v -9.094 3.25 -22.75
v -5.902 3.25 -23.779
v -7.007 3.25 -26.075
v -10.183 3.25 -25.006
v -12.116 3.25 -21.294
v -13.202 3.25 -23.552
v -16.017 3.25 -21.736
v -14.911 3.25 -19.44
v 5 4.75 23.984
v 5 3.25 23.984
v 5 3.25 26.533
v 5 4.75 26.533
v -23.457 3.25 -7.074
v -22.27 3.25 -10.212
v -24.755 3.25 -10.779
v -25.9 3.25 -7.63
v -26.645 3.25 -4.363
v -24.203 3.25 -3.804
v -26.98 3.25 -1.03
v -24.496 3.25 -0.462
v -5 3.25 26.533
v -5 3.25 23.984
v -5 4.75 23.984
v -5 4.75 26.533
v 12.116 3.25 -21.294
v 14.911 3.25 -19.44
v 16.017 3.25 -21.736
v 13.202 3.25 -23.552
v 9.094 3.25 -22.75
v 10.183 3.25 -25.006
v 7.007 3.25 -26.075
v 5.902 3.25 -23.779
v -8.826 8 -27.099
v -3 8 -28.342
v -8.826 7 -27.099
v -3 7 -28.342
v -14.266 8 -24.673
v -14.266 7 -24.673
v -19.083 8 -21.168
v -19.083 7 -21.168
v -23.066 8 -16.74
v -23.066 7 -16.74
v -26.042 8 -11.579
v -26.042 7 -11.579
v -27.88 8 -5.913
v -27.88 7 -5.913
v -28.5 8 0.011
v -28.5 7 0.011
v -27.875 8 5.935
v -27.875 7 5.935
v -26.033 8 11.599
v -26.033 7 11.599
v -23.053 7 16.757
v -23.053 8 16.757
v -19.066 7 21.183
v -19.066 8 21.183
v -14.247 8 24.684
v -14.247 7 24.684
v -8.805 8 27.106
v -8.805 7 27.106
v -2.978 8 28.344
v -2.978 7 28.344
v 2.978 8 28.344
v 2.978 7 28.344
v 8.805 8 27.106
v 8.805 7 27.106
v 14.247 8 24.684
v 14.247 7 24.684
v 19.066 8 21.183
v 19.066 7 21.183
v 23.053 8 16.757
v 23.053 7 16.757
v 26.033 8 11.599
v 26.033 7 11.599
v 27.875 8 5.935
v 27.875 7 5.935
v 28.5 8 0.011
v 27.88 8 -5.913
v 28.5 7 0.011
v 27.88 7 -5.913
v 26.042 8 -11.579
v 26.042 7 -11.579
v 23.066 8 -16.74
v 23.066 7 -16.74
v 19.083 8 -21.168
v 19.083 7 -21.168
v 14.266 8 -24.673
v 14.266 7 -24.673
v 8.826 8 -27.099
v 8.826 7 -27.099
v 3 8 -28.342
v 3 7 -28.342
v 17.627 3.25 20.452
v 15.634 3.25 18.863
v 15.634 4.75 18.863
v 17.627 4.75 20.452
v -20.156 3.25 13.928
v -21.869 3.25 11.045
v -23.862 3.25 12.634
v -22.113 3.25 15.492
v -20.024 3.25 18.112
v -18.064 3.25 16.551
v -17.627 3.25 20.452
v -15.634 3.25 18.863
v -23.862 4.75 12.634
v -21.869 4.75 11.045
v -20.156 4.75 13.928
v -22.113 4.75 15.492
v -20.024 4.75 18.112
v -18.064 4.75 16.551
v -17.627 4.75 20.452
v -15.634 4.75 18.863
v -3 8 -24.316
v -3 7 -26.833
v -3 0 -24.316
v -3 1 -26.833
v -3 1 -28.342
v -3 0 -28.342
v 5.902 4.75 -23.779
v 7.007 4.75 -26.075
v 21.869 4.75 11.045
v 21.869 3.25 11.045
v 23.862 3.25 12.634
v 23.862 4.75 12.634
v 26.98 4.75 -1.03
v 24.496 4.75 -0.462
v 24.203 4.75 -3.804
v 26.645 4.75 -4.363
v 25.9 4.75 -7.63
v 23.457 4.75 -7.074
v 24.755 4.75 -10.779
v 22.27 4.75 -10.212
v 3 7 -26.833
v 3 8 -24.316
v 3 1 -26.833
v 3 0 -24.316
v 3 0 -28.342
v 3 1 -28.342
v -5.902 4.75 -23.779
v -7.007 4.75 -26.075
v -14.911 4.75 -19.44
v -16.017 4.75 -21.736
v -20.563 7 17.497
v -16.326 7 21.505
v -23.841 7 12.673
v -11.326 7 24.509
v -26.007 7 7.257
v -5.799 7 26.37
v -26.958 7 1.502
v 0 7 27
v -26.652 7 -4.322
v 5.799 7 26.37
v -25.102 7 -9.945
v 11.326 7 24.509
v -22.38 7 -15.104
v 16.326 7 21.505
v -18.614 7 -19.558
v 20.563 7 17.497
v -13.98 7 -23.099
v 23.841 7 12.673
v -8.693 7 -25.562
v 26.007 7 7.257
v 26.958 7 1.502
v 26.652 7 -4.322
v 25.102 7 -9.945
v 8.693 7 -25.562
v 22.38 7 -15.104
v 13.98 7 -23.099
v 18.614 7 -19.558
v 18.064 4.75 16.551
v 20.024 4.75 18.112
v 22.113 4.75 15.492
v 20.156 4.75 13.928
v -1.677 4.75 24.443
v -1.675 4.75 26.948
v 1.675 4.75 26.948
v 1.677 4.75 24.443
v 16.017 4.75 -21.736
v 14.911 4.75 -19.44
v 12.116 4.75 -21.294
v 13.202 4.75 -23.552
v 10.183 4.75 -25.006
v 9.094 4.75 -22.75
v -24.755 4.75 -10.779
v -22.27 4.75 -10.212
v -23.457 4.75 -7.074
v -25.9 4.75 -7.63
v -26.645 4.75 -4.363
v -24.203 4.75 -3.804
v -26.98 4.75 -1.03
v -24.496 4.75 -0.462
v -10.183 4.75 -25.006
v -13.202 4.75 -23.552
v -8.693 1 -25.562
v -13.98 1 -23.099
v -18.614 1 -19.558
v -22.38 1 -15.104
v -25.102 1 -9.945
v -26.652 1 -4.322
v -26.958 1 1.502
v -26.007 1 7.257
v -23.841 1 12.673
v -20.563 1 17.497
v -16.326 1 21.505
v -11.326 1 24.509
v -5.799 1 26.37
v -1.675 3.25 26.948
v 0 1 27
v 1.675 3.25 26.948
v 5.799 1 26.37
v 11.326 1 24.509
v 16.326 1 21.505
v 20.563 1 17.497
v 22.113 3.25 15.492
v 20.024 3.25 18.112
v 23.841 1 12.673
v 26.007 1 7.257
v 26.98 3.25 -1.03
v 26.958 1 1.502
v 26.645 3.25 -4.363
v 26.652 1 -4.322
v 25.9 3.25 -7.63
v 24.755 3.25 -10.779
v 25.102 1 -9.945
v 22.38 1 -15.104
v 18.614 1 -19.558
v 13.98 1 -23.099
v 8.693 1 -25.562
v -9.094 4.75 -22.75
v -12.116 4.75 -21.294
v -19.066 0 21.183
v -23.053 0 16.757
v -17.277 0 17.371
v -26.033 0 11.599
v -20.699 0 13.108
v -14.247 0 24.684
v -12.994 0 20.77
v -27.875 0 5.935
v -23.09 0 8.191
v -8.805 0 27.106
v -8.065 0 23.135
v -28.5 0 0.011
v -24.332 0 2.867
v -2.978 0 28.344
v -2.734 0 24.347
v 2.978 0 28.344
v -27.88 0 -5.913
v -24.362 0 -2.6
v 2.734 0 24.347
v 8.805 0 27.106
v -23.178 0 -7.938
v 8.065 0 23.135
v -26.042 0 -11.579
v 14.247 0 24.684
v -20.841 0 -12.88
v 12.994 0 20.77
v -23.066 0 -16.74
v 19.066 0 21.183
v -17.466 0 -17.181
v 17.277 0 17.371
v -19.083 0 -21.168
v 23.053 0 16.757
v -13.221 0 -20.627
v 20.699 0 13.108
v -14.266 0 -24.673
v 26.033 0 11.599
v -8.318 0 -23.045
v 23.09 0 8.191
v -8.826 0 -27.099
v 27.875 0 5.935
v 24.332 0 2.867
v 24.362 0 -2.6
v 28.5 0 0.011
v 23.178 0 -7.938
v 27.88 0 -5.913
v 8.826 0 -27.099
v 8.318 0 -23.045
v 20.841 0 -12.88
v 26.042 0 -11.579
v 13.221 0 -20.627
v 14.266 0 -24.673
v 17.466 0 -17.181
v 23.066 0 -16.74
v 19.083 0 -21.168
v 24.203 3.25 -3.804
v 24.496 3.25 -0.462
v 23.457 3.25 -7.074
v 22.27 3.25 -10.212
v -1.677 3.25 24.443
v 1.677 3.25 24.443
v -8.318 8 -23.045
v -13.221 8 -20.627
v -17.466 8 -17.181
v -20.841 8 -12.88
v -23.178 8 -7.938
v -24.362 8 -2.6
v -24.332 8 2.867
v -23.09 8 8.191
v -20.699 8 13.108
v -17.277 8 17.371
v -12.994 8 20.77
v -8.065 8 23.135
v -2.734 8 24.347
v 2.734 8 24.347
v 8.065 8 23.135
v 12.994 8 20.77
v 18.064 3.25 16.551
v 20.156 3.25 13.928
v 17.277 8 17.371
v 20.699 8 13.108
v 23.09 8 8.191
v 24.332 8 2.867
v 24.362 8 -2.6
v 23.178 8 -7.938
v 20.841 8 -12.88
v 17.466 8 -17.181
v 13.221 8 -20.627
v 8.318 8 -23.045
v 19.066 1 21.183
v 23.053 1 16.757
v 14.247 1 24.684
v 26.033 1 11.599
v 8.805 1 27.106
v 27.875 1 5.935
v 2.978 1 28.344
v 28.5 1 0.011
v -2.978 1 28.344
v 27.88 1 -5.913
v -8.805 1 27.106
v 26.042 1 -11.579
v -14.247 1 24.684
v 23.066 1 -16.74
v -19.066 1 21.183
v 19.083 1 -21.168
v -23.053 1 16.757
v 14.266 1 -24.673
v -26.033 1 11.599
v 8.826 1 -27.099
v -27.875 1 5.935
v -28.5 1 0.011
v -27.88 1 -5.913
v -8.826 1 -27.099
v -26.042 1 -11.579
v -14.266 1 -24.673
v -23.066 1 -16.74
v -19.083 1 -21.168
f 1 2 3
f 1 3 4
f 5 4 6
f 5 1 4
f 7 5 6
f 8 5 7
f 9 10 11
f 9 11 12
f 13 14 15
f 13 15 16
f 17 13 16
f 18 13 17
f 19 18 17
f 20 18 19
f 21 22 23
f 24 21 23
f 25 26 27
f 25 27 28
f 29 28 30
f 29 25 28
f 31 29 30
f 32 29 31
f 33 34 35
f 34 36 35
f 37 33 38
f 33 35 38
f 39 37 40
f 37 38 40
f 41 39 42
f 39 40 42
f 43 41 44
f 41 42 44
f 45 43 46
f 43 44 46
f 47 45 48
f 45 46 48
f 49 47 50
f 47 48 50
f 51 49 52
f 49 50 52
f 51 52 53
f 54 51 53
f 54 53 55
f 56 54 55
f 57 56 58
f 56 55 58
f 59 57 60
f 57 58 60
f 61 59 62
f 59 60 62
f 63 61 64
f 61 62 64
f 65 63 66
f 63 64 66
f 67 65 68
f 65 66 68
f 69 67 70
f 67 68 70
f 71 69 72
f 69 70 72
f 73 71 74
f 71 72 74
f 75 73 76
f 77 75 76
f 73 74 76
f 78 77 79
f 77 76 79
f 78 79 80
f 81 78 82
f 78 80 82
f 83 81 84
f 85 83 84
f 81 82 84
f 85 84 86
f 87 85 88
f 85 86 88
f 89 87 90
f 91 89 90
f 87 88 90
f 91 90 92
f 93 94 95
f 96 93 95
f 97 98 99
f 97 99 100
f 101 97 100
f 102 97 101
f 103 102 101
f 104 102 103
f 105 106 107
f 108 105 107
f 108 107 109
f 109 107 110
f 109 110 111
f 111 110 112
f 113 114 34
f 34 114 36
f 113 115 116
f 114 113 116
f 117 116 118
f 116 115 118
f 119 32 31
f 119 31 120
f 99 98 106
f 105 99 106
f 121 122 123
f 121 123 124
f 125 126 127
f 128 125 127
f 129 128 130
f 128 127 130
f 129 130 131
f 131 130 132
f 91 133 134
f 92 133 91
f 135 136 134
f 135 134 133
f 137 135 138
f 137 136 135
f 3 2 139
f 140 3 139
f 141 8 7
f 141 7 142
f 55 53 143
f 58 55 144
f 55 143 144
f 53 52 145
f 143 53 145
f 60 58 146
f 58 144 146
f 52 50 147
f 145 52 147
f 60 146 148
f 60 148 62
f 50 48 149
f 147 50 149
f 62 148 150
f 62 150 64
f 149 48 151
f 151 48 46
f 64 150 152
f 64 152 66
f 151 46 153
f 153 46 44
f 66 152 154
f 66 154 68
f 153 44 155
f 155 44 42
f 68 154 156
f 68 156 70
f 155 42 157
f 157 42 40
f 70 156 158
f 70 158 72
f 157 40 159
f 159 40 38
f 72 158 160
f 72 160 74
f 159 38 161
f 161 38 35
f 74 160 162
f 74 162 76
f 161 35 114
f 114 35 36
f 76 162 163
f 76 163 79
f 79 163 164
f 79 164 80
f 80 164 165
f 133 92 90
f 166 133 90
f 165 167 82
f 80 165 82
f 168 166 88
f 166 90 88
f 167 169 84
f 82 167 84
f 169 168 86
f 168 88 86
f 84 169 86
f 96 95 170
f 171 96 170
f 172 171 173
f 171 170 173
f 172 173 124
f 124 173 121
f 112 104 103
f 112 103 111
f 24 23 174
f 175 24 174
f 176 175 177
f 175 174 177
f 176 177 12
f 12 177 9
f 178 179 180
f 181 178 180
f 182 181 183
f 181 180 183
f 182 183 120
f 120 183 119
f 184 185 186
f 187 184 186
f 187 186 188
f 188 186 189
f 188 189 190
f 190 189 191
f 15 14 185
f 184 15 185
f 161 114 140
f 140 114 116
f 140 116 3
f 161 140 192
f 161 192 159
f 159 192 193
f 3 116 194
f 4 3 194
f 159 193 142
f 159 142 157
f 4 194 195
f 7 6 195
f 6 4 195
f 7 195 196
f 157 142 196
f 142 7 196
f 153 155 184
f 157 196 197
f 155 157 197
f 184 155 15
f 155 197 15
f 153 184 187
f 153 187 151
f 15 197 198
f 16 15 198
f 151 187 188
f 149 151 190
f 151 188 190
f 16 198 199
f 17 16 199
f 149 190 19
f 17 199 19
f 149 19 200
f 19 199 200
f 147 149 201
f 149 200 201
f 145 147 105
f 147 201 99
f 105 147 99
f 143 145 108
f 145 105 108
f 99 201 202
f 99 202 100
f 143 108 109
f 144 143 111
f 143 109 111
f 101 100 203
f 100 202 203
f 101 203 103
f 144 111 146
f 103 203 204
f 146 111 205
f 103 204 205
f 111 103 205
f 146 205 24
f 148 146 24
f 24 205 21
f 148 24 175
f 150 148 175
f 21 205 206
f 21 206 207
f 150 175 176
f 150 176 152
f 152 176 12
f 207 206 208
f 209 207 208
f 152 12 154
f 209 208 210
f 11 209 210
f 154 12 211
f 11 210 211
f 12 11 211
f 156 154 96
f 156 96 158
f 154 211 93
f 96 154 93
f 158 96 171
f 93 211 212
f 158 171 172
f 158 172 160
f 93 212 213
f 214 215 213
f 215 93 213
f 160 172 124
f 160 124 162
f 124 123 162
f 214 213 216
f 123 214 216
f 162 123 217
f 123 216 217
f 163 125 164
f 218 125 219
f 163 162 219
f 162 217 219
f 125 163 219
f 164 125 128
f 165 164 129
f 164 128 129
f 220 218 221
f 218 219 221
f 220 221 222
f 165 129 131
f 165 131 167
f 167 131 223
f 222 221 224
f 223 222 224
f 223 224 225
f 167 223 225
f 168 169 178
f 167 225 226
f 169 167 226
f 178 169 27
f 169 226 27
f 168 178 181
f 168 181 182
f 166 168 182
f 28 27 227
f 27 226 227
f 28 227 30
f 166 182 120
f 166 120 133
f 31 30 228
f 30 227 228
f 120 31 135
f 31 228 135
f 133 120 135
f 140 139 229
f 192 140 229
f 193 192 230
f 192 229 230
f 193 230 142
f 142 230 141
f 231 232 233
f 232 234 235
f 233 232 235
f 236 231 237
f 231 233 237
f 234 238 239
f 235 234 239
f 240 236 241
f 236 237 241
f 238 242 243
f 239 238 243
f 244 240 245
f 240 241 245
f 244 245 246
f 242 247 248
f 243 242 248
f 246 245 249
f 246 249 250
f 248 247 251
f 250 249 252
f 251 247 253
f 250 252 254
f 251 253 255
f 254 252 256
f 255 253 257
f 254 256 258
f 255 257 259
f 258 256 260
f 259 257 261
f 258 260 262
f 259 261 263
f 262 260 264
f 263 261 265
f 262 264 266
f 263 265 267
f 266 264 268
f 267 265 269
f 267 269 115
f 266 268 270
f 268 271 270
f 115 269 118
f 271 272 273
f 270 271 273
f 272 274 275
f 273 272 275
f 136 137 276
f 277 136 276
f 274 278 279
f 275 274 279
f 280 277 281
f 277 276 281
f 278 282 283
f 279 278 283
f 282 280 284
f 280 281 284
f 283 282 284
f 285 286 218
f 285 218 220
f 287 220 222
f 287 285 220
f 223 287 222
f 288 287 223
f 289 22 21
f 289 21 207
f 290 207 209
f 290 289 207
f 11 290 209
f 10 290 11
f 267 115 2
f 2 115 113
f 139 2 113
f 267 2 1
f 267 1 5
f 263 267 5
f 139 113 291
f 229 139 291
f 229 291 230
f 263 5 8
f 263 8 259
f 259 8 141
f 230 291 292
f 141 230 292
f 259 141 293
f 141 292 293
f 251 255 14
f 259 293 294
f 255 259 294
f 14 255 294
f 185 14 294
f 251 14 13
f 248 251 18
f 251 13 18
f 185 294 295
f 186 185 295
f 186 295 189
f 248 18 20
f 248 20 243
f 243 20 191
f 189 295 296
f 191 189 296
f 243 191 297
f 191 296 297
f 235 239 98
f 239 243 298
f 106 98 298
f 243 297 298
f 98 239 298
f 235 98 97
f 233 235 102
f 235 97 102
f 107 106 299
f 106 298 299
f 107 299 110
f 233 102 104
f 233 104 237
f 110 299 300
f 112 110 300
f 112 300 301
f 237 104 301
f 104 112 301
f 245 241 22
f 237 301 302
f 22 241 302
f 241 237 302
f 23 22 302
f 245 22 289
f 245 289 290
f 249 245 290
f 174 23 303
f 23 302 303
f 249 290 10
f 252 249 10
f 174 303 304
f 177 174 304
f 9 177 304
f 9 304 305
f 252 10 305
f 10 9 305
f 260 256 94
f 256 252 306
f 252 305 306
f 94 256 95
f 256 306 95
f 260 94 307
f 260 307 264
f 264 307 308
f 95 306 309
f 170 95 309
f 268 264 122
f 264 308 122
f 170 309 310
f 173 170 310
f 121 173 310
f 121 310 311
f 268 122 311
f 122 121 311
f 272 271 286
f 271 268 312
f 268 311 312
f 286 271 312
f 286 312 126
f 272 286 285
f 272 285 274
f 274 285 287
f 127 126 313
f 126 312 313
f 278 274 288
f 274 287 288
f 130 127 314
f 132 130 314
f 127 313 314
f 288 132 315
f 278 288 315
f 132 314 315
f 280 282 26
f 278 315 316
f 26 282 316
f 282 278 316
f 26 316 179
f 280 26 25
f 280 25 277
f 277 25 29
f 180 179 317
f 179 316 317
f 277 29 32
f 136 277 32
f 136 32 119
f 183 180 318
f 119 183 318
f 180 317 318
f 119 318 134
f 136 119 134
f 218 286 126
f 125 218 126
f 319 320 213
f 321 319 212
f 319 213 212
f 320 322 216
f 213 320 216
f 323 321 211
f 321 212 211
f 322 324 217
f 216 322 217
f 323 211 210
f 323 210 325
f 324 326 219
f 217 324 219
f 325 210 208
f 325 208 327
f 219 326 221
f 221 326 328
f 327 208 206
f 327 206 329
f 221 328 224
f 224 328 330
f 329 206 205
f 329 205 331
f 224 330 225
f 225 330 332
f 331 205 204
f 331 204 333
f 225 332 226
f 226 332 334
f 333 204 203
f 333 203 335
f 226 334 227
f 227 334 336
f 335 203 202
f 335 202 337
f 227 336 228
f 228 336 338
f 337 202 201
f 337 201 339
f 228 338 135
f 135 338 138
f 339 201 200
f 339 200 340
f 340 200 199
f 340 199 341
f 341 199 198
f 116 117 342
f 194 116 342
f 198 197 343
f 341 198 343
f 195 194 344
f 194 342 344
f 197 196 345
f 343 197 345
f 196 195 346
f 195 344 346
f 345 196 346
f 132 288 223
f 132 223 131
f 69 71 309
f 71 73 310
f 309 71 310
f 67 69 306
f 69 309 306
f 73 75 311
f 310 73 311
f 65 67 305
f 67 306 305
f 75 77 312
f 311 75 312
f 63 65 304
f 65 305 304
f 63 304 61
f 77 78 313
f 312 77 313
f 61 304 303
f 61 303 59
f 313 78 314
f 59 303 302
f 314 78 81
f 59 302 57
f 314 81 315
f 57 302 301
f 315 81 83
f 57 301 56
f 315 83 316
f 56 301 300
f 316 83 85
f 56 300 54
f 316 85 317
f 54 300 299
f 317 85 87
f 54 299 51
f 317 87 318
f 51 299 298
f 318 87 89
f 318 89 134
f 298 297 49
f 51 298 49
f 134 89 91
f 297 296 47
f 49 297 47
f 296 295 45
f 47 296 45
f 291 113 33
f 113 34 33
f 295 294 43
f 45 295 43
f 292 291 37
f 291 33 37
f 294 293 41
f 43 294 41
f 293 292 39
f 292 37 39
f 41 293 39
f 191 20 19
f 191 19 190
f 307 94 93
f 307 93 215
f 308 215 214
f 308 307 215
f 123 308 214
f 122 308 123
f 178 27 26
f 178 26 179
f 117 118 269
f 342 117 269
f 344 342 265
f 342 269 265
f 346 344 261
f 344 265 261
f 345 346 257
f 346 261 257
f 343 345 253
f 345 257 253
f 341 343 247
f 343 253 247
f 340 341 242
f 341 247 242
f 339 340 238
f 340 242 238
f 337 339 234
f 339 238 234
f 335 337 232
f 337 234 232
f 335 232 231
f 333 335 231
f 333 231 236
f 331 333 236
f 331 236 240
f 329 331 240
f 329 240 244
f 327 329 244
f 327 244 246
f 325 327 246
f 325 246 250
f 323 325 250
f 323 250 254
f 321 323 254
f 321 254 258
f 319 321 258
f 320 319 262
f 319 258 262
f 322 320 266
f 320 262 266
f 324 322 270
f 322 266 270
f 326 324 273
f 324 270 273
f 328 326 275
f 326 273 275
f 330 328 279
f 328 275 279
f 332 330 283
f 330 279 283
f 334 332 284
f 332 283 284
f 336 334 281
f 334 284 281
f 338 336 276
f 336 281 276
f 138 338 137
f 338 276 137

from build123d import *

# Parameters (mm, degrees)
SKETCH_2_W               = 6
SKETCH_2_H               = 57
CUT_EXTRUDE_1_DEPTH      = 9
SKETCH_3_W               = 10
SKETCH_3_H               = 1.5
CUT_EXTRUDE_2_DEPTH      = 29.5
PATTERN_CIRCULAR_1_COUNT = 7


with BuildPart() as part:
    # Эскиз1 → Повернуть1 (revolve)
    with BuildSketch(Plane.XY):
        Polygon((24.5, 0), (24.5, 8), (28.5, 8), (28.5, 7), (27, 7), (27, 1), (28.5, 1), (28.5, 0), align=None)
    revolve(axis=Axis((0, 0, 0), (0, 1, 0)))

    # Эскиз2 → Вырез-Вытянуть1 (cut, through all)
    with BuildSketch(Plane(origin=(0, 0, 0), x_dir=(1, 0, 0), z_dir=(0, 1, 0))):
        with Locations((0, 28.5)):
            Rectangle(SKETCH_2_W, SKETCH_2_H)
    extrude(amount=CUT_EXTRUDE_1_DEPTH, mode=Mode.SUBTRACT)

    # Эскиз3 → Вырез-Вытянуть2 (cut, through all)
    with BuildSketch(Plane.XY):
        with Locations((0, 4)):
            Rectangle(SKETCH_3_W, SKETCH_3_H)
    cut_extrude_2 = extrude(amount=CUT_EXTRUDE_2_DEPTH, mode=Mode.SUBTRACT)

    # Круговой массив1: Вырез-Вытянуть2 ×7 about axis
    pattern_circular_1_axis = Axis((0, 0, 0), (0, 1, 0))
    for i in range(1, PATTERN_CIRCULAR_1_COUNT):
        add(cut_extrude_2.rotate(pattern_circular_1_axis, i * 360 / PATTERN_CIRCULAR_1_COUNT), mode=Mode.SUBTRACT)


solid = part.part
